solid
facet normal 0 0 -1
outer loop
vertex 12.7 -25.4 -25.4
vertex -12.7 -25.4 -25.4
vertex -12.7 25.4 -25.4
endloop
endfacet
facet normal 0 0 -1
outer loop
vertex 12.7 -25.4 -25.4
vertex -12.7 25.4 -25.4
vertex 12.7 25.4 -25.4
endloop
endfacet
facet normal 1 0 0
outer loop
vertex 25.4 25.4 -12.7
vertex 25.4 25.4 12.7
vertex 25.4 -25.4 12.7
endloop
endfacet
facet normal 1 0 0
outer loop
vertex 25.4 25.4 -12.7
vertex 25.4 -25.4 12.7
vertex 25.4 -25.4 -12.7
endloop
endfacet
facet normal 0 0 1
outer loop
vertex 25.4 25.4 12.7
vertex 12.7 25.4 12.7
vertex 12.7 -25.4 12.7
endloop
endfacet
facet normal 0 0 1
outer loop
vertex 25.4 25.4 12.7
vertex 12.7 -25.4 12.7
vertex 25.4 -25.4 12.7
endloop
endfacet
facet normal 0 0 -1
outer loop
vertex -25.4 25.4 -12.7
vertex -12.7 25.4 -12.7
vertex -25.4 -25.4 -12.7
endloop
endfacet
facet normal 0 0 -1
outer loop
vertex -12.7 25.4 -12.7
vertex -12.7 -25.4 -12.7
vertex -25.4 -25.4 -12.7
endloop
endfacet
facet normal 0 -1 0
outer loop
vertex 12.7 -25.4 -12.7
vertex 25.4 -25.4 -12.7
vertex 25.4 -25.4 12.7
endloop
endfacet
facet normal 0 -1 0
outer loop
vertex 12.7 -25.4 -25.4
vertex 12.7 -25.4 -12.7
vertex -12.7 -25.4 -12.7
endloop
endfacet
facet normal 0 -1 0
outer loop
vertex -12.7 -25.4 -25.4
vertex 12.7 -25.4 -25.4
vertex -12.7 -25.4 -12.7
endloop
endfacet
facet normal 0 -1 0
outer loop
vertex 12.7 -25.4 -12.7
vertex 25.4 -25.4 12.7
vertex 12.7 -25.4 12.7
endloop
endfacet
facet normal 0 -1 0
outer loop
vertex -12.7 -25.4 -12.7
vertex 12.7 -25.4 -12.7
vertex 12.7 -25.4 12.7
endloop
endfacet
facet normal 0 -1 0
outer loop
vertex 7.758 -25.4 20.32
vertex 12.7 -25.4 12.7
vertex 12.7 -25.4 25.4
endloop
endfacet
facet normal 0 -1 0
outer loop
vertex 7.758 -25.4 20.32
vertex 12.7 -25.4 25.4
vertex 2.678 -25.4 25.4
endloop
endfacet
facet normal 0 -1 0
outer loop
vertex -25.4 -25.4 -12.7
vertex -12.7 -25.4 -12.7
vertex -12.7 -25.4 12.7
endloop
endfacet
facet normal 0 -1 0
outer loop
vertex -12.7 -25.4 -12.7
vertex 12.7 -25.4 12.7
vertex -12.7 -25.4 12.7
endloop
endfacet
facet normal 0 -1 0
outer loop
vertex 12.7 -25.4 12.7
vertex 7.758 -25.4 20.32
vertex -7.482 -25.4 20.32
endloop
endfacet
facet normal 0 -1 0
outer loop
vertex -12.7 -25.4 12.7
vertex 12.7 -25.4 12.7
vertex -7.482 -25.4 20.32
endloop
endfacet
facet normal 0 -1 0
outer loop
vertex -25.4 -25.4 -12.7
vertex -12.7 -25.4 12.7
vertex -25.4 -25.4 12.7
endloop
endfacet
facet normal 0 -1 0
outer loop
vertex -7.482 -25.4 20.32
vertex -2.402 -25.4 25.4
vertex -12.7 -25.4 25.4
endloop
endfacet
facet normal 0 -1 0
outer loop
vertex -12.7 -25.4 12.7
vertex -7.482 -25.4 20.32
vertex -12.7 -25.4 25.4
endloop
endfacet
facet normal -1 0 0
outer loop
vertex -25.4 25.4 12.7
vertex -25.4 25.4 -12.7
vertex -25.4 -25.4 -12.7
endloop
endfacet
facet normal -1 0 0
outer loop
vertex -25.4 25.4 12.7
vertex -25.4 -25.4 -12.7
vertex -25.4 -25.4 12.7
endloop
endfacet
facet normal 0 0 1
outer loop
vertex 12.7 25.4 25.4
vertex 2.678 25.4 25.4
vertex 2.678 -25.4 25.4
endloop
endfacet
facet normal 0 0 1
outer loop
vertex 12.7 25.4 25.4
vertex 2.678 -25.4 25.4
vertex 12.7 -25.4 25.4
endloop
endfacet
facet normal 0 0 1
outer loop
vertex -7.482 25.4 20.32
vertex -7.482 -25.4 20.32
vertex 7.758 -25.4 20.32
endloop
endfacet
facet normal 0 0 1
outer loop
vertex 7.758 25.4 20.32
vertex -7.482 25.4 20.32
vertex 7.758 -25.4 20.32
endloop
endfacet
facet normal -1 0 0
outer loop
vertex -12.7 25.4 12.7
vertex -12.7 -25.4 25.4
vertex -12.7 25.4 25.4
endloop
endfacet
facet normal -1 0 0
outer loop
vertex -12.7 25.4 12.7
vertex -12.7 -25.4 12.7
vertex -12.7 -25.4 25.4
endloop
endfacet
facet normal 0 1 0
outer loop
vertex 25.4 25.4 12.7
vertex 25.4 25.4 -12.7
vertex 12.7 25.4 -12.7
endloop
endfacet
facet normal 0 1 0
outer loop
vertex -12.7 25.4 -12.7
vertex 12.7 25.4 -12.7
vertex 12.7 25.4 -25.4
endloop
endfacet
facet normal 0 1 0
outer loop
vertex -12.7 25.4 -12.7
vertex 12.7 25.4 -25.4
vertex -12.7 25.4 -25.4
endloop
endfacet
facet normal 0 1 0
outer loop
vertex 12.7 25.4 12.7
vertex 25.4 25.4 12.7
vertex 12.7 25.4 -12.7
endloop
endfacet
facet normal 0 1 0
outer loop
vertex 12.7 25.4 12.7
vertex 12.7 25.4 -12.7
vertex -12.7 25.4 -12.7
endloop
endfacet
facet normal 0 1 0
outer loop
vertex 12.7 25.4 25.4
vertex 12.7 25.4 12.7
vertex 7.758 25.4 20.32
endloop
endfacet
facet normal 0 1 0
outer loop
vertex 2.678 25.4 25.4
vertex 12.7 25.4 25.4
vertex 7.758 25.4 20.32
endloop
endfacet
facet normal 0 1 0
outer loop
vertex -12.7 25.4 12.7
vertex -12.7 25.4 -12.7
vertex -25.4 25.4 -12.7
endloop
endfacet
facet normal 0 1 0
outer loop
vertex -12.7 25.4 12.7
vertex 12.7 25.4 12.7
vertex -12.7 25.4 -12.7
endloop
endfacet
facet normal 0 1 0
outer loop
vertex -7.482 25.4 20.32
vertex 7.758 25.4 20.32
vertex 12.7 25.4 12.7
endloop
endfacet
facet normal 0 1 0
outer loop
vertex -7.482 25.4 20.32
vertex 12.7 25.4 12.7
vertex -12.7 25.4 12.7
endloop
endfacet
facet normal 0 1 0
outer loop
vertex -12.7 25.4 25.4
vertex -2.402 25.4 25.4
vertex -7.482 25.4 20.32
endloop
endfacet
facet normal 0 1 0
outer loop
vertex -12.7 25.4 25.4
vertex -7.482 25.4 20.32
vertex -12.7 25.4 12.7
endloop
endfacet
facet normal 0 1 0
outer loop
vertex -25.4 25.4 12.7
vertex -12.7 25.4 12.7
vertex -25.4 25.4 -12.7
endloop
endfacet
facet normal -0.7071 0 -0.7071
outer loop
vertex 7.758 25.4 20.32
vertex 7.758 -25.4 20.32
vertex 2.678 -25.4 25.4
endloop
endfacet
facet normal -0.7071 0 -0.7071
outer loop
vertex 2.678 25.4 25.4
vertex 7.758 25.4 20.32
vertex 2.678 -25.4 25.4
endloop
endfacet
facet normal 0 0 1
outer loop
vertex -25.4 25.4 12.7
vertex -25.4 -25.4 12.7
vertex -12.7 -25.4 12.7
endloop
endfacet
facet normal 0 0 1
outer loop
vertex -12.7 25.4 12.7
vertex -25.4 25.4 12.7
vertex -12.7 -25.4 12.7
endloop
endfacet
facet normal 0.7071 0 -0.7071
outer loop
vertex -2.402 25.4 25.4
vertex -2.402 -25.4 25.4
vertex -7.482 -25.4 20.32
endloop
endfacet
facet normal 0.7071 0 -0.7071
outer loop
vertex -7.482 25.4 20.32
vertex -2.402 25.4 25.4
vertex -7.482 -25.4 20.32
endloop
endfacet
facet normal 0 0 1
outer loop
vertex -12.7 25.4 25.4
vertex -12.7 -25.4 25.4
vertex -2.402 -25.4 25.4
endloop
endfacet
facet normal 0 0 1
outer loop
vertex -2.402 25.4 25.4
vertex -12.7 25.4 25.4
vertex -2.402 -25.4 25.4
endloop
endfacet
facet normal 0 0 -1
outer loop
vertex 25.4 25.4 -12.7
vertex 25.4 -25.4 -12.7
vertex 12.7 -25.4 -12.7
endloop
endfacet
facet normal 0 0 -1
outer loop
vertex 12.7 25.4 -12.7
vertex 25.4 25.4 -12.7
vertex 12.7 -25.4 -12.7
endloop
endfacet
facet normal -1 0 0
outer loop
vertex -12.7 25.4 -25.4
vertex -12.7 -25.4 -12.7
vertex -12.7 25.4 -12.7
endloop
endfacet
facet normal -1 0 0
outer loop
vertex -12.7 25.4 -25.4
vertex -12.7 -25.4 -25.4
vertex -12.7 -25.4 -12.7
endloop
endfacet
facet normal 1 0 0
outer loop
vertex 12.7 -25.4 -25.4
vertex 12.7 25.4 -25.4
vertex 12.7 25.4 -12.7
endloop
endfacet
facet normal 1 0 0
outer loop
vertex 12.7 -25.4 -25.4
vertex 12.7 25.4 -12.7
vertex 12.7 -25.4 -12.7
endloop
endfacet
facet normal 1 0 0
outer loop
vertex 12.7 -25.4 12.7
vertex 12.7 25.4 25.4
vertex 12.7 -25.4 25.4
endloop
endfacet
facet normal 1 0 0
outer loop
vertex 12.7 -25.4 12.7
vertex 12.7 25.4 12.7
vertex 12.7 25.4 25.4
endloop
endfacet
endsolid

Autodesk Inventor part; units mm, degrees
ref_plane "YZ Plane" through (0, 0, 0) normal (1, 0, 0) x (0, 1, 0)
ref_plane "XZ Plane" through (0, 0, 0) normal (0, 1, 0) x (-1, 0, 0)
ref_plane "XY Plane" through (0, 0, 0) normal (0, 0, 1) x (1, 0, 0)
sketch "Sketch1" plane through (0, 0, 0) normal (0, 1, 0) x (-1, 0, 0)
  line L0 (-25.4, -12.7) -> (25.4, -12.7)
  line L1 (25.4, -12.7) -> (25.4, 12.7)
  line L2 (25.4, 12.7) -> (-25.4, 12.7)
  line L3 (-25.4, 12.7) -> (-25.4, -12.7)
  line L4 (-25.4, -12.7) -> (25.4, 12.7) construction
  line L5 (25.4, -12.7) -> (-25.4, 12.7) construction
  point P0 (0, 0)
  dimension "d0" = 25.4
  dimension "d1" = 50.8
extrude "Extrusion1" add sketch "Sketch1" along normal mid plane 50.8
sketch "Sketch2" plane through (-25.4, 25.4, 12.7) normal (0, 0, 1) x (1, 0, 0)
  line L0 (50.8, 0) -> (0, 0) projected
  line L1 (38.1, -50.8) -> (12.7, -50.8)
  line L2 (12.7, -50.8) -> (12.7, 0)
  line L3 (12.7, 0) -> (38.1, 0)
  line L4 (38.1, 0) -> (38.1, -50.8)
  line L5 (38.1, -50.8) -> (12.7, 0) construction
  line L6 (12.7, -50.8) -> (38.1, 0) construction
  point P0 (25.4, -25.4)
  dimension "d4" = 50.8
  dimension "d5" = 25.4
extrude "Extrusion2" add sketch "Sketch2" along normal blind 12.7 and the other way blind 38.1
sketch "Sketch3" plane through (0, -25.4, 0) normal (0, -1, 0) x (1, 0, 0)
  line L0 (12.7, 25.4) -> (-12.7, 25.4) projected
  line L1 (0, 25.4) -> (-2.4016, 25.4)
  line L2 (-7.4816, 20.32) -> (7.7584, 20.32)
  line L3 (7.7584, 20.32) -> (2.6784, 25.4)
  line L4 (-2.4016, 25.4) -> (-7.4816, 20.32)
  point P0 (0, 0)
  dimension "d10" = 5.08
  dimension "d11" = 5.08
  dimension "d12" = 15.24
  dimension "d13" = 45
  dimension "d14" = 25.4
  dimension "d15" = 45
extrude "Extrusion3" cut sketch "Sketch3" against normal up to next
properties part number "test3"
